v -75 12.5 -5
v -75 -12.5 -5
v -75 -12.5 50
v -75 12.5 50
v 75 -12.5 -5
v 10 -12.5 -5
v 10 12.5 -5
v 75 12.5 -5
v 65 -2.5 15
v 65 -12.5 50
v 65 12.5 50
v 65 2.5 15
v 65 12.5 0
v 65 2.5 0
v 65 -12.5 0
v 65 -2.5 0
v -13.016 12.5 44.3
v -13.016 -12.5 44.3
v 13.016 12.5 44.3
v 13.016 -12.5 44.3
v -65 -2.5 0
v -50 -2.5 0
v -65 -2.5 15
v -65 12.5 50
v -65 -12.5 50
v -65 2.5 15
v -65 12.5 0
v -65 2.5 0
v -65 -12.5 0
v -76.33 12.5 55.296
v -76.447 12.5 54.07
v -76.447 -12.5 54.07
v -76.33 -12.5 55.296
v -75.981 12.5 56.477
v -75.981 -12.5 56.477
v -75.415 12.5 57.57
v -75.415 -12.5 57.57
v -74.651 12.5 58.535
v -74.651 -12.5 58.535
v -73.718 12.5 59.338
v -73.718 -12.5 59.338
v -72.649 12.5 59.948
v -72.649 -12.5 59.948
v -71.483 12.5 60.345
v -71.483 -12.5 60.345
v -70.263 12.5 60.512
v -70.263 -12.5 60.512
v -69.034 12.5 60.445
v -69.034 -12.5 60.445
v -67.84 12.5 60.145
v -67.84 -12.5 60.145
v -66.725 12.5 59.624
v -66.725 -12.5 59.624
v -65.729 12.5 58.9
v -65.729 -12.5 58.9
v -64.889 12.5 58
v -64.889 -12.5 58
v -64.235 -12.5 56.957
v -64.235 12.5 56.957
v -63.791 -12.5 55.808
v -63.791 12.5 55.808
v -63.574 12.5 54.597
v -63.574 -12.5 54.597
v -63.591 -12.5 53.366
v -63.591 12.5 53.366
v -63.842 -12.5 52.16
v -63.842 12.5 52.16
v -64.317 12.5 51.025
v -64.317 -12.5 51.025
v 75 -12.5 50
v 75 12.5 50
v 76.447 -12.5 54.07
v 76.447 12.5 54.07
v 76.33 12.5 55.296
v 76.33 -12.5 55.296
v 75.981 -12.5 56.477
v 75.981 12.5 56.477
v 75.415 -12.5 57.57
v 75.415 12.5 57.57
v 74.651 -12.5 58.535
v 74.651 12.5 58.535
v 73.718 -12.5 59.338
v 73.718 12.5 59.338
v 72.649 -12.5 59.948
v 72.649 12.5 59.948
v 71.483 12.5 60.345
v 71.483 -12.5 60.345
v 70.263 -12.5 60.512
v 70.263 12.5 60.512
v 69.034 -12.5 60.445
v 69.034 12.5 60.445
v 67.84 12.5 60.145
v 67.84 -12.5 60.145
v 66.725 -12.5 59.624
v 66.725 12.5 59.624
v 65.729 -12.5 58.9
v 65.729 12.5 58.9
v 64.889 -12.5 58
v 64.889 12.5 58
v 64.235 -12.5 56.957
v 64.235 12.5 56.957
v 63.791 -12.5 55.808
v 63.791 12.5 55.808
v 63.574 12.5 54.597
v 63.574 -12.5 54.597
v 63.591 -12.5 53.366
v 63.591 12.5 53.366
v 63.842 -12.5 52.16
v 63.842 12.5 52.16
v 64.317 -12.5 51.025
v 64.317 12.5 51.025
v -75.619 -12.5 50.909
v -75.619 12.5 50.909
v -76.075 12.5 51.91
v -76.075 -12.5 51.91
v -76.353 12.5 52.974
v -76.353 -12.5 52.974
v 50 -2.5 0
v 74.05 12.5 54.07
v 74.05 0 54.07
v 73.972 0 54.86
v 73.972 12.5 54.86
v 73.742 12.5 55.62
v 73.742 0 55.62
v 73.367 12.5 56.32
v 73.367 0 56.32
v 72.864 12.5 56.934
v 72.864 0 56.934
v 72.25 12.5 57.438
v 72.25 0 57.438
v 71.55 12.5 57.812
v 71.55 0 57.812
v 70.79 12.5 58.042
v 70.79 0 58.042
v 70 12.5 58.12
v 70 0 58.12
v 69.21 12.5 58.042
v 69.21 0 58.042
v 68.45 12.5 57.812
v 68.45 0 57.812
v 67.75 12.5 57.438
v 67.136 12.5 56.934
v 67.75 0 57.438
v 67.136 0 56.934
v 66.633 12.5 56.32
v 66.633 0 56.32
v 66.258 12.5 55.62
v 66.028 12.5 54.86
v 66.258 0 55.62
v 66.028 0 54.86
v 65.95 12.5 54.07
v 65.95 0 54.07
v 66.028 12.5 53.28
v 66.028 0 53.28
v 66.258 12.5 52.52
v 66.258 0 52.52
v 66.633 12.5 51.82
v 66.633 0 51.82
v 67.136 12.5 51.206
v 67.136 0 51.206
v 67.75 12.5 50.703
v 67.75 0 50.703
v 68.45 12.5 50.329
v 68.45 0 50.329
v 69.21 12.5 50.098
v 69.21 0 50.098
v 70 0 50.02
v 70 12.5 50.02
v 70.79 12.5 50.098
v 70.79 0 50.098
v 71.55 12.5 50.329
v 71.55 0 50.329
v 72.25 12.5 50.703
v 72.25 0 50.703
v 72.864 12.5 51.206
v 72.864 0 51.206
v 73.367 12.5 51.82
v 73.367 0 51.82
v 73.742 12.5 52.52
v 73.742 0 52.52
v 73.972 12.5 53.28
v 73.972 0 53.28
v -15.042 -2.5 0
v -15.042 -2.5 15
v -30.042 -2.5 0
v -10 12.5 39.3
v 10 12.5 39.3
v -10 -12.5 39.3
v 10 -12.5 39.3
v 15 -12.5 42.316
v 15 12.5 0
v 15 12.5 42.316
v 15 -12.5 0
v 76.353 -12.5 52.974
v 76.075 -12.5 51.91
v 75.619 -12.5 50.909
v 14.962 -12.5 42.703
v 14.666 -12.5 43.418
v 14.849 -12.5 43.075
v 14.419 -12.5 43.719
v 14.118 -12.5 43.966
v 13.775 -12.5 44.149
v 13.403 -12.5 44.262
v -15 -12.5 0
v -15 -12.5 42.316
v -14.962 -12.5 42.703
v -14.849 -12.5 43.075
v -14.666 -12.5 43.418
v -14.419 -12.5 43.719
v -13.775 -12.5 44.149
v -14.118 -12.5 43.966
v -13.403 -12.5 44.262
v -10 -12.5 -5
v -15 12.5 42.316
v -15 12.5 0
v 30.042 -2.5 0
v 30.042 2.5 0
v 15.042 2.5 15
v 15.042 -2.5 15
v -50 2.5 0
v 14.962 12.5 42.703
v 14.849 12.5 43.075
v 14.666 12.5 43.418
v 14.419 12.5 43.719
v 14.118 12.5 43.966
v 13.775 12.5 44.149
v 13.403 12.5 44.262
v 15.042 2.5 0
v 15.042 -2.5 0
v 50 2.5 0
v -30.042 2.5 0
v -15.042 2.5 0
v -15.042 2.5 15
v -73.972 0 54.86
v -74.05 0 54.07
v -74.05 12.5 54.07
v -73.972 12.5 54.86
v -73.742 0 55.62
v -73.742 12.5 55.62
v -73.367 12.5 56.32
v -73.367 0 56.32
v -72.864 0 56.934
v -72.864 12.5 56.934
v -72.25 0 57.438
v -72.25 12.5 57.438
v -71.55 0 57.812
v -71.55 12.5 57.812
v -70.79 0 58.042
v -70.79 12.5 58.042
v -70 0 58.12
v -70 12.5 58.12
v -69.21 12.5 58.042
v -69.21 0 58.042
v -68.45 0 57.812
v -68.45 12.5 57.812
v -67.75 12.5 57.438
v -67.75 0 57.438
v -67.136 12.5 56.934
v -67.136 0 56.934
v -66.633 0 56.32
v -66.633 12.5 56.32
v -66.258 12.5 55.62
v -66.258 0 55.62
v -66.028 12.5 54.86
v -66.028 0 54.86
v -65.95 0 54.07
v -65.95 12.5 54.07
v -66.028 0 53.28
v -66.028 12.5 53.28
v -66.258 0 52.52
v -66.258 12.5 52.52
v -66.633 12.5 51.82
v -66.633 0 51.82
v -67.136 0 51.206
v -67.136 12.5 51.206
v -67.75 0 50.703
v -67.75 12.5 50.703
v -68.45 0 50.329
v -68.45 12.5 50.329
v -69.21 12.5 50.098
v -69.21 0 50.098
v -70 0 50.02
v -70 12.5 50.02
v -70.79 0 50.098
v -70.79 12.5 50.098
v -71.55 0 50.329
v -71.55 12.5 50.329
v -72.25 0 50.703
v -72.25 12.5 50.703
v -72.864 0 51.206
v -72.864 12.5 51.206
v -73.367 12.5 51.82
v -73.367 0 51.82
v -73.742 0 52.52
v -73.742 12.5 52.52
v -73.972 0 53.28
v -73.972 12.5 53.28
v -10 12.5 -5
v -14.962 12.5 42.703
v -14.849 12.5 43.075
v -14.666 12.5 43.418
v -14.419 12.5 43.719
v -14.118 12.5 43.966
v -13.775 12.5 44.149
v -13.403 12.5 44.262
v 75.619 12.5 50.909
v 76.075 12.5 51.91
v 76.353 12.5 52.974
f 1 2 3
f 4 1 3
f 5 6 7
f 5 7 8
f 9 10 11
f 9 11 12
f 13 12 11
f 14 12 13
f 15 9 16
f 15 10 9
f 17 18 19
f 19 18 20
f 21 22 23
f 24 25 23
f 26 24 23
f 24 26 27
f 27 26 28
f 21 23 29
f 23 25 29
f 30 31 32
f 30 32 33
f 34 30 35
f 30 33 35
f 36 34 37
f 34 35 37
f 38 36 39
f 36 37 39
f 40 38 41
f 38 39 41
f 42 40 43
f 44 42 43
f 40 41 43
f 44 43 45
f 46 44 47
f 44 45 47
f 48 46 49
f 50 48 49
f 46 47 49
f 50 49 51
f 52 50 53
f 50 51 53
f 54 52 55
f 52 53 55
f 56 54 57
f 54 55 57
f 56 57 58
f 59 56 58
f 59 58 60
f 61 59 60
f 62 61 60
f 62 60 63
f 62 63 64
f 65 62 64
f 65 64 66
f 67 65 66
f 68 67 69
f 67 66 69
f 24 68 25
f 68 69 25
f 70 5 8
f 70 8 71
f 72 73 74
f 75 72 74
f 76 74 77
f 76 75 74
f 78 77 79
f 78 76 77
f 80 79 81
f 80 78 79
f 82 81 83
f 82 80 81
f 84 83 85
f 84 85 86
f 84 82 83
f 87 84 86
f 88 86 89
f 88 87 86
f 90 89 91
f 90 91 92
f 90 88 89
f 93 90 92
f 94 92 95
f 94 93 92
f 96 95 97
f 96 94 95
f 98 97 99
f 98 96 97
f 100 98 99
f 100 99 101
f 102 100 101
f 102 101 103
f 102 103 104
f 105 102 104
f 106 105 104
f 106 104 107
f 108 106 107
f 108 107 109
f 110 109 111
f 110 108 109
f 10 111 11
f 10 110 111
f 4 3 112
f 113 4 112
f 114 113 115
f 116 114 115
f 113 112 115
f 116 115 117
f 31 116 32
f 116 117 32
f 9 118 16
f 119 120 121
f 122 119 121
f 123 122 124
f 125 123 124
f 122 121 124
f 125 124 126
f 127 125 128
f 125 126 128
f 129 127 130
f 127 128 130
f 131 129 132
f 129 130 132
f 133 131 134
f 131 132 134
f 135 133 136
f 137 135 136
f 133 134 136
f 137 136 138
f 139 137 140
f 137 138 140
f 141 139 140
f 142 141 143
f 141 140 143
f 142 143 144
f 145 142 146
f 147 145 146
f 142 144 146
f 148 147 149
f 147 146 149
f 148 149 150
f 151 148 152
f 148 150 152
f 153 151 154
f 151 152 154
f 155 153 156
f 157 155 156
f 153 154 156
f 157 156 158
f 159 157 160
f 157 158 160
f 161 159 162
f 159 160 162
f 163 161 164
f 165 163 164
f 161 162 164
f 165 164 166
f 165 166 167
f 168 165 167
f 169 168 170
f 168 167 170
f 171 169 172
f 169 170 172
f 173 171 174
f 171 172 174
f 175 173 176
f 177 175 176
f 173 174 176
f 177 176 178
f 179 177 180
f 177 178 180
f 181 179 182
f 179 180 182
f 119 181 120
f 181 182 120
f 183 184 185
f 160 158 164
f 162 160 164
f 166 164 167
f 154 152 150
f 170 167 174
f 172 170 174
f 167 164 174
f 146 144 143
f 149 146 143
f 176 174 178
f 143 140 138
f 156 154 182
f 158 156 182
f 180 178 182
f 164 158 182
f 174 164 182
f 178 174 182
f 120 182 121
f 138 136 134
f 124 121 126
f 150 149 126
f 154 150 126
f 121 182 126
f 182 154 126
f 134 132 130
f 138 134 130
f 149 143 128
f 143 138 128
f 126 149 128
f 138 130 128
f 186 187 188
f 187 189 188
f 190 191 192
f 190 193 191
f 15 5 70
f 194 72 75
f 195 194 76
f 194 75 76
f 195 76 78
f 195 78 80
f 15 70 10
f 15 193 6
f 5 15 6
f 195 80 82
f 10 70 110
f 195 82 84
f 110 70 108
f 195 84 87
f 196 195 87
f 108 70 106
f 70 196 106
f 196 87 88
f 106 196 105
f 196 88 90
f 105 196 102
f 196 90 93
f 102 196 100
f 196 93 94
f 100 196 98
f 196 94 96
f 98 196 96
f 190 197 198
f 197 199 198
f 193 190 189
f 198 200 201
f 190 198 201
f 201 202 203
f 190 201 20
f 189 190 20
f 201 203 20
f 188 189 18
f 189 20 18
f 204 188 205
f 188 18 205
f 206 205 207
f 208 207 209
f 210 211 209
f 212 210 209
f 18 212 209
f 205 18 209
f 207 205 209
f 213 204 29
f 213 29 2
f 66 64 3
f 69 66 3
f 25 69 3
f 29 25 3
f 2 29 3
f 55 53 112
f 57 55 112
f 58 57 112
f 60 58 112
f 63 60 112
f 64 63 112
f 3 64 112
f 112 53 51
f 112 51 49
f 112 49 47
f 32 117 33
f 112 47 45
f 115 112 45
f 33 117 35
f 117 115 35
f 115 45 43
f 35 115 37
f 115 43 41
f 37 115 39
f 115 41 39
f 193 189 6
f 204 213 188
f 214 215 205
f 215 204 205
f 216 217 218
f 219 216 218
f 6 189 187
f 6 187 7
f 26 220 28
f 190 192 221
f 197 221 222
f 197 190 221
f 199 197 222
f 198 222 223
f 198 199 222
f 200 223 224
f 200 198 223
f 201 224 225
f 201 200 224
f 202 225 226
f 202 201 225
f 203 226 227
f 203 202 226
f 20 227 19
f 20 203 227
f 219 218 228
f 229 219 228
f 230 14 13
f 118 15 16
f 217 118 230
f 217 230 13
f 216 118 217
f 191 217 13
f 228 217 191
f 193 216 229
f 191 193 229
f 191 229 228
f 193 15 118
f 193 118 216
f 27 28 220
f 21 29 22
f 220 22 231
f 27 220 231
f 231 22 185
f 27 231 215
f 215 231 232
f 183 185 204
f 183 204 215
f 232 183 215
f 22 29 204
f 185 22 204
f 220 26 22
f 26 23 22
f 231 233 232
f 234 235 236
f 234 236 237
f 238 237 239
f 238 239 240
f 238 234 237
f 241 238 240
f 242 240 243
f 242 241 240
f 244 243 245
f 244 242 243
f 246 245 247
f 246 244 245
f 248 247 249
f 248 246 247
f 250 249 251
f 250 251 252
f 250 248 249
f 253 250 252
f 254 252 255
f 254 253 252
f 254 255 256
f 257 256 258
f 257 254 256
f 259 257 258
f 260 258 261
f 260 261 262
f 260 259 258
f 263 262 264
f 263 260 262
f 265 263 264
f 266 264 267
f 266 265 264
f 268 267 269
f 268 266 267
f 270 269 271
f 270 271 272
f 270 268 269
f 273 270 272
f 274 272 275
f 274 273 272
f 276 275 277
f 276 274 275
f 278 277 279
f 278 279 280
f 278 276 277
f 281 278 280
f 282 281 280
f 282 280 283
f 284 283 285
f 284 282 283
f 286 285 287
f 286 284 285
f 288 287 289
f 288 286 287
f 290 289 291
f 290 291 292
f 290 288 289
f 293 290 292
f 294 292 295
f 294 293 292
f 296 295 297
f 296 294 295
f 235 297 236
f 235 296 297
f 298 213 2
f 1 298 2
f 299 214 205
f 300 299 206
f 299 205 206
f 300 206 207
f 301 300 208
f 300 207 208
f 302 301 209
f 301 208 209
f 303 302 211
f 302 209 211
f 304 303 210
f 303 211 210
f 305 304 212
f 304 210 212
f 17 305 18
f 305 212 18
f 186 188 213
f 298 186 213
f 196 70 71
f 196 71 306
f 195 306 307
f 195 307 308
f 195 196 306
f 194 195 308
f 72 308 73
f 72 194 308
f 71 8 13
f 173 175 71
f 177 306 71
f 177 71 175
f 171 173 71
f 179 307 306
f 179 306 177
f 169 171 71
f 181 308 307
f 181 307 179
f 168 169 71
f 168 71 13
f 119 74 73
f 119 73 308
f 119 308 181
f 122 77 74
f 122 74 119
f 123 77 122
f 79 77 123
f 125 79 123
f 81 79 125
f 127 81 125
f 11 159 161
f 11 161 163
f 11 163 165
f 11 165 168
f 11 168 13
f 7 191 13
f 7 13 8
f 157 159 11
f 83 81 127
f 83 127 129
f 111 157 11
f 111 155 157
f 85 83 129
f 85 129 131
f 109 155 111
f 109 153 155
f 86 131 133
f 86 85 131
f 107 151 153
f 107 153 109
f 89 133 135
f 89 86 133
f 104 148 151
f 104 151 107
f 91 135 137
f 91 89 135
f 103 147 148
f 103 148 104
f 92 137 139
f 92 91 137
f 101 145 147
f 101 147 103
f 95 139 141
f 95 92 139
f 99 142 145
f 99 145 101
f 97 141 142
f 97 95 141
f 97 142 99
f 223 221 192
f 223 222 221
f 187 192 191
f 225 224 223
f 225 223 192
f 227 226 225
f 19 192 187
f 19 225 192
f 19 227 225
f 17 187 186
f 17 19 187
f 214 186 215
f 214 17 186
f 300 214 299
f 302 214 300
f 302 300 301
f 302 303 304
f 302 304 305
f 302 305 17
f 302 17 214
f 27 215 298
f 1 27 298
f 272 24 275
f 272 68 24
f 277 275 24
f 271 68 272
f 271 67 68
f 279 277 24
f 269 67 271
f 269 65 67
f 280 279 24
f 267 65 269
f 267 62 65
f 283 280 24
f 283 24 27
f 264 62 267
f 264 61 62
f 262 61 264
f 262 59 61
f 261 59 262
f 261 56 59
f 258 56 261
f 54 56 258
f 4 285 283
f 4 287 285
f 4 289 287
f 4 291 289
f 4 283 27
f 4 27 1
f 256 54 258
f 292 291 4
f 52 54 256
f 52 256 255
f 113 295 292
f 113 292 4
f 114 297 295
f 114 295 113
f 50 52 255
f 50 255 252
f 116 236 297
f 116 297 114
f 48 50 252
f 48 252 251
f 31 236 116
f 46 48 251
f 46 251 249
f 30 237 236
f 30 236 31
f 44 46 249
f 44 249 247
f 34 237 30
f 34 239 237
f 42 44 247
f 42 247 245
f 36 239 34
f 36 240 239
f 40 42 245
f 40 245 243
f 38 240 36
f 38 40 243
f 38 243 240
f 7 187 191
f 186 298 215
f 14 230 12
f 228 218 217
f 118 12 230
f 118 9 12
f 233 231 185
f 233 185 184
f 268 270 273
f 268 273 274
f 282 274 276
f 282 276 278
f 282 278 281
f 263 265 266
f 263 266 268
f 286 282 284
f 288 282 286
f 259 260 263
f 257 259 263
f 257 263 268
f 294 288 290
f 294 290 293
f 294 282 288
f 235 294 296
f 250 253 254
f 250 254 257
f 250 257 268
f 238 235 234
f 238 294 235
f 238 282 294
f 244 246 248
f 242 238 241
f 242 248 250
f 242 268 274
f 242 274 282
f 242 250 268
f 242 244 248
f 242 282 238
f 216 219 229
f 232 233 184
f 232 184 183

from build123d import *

# Parameters (mm, degrees)
F1_DEPTH = 12.5
F3_DEPTH = 2.5
F4_R     = 1.983726
F5_R     = 4.05
F6_DEPTH = 12.5


with BuildPart() as f1:
    # F0 (on Front) → F1 (new body, symmetric)
    with BuildSketch(Plane.XZ):
        with BuildLine():
            Line((65, 0), (15, 0))
            Line((15, 0), (15, 44.3))
            Line((15, 44.3), (0, 44.3))
            Line((0, 44.3), (0, 39.3))
            Line((0, 39.3), (10, 39.3))
            Line((10, 39.3), (10, -5))
            Line((10, -5), (75, -5))
            Line((75, -5), (75, 50))
            ThreePointArc((75, 50), (70, 47.623014), (65, 50))
            Line((65, 50), (65, 0))
        make_face()
        with BuildLine():
            Line((75, 50), (65, 50))
            ThreePointArc((65, 50), (70, 47.623014), (75, 50))
        make_face()
        with BuildLine():
            ThreePointArc((76.447254, 54.070268), (67.840045, 60.144943), (65, 50))
            Line((65, 50), (75, 50))
            ThreePointArc((75, 50), (76.074675, 51.910313), (76.447254, 54.070268))
        make_face()
    extrude(amount=F1_DEPTH, both=True)

    # F2 (on Front) → F3 (join, symmetric)
    with BuildSketch(Plane.XZ):
        Polygon((15.042217, 15), (15.042217, 0), (30.042217, 0), align=None)
        Polygon((50, 0), (65, 0), (65, 15), align=None)
    extrude(amount=F3_DEPTH, both=True)

    # F4
    f4_edges = [f1.edges().sort_by_distance(p)[0] for p in [
        (15, 0, 44.3),
    ]]
    fillet(f4_edges, radius=F4_R)

    # F5 (on Front) → F6 (cut, through all)
    with BuildSketch(Plane.XZ):
        with Locations((70, 54.070268)):
            Circle(F5_R)
    extrude(amount=-F6_DEPTH, mode=Mode.SUBTRACT)

    # F7: F1 across plane


with BuildPart() as f1_1:
    add(f1.part)
    add(f1.part.mirror(Plane.YZ))


solid = f1_1.part
